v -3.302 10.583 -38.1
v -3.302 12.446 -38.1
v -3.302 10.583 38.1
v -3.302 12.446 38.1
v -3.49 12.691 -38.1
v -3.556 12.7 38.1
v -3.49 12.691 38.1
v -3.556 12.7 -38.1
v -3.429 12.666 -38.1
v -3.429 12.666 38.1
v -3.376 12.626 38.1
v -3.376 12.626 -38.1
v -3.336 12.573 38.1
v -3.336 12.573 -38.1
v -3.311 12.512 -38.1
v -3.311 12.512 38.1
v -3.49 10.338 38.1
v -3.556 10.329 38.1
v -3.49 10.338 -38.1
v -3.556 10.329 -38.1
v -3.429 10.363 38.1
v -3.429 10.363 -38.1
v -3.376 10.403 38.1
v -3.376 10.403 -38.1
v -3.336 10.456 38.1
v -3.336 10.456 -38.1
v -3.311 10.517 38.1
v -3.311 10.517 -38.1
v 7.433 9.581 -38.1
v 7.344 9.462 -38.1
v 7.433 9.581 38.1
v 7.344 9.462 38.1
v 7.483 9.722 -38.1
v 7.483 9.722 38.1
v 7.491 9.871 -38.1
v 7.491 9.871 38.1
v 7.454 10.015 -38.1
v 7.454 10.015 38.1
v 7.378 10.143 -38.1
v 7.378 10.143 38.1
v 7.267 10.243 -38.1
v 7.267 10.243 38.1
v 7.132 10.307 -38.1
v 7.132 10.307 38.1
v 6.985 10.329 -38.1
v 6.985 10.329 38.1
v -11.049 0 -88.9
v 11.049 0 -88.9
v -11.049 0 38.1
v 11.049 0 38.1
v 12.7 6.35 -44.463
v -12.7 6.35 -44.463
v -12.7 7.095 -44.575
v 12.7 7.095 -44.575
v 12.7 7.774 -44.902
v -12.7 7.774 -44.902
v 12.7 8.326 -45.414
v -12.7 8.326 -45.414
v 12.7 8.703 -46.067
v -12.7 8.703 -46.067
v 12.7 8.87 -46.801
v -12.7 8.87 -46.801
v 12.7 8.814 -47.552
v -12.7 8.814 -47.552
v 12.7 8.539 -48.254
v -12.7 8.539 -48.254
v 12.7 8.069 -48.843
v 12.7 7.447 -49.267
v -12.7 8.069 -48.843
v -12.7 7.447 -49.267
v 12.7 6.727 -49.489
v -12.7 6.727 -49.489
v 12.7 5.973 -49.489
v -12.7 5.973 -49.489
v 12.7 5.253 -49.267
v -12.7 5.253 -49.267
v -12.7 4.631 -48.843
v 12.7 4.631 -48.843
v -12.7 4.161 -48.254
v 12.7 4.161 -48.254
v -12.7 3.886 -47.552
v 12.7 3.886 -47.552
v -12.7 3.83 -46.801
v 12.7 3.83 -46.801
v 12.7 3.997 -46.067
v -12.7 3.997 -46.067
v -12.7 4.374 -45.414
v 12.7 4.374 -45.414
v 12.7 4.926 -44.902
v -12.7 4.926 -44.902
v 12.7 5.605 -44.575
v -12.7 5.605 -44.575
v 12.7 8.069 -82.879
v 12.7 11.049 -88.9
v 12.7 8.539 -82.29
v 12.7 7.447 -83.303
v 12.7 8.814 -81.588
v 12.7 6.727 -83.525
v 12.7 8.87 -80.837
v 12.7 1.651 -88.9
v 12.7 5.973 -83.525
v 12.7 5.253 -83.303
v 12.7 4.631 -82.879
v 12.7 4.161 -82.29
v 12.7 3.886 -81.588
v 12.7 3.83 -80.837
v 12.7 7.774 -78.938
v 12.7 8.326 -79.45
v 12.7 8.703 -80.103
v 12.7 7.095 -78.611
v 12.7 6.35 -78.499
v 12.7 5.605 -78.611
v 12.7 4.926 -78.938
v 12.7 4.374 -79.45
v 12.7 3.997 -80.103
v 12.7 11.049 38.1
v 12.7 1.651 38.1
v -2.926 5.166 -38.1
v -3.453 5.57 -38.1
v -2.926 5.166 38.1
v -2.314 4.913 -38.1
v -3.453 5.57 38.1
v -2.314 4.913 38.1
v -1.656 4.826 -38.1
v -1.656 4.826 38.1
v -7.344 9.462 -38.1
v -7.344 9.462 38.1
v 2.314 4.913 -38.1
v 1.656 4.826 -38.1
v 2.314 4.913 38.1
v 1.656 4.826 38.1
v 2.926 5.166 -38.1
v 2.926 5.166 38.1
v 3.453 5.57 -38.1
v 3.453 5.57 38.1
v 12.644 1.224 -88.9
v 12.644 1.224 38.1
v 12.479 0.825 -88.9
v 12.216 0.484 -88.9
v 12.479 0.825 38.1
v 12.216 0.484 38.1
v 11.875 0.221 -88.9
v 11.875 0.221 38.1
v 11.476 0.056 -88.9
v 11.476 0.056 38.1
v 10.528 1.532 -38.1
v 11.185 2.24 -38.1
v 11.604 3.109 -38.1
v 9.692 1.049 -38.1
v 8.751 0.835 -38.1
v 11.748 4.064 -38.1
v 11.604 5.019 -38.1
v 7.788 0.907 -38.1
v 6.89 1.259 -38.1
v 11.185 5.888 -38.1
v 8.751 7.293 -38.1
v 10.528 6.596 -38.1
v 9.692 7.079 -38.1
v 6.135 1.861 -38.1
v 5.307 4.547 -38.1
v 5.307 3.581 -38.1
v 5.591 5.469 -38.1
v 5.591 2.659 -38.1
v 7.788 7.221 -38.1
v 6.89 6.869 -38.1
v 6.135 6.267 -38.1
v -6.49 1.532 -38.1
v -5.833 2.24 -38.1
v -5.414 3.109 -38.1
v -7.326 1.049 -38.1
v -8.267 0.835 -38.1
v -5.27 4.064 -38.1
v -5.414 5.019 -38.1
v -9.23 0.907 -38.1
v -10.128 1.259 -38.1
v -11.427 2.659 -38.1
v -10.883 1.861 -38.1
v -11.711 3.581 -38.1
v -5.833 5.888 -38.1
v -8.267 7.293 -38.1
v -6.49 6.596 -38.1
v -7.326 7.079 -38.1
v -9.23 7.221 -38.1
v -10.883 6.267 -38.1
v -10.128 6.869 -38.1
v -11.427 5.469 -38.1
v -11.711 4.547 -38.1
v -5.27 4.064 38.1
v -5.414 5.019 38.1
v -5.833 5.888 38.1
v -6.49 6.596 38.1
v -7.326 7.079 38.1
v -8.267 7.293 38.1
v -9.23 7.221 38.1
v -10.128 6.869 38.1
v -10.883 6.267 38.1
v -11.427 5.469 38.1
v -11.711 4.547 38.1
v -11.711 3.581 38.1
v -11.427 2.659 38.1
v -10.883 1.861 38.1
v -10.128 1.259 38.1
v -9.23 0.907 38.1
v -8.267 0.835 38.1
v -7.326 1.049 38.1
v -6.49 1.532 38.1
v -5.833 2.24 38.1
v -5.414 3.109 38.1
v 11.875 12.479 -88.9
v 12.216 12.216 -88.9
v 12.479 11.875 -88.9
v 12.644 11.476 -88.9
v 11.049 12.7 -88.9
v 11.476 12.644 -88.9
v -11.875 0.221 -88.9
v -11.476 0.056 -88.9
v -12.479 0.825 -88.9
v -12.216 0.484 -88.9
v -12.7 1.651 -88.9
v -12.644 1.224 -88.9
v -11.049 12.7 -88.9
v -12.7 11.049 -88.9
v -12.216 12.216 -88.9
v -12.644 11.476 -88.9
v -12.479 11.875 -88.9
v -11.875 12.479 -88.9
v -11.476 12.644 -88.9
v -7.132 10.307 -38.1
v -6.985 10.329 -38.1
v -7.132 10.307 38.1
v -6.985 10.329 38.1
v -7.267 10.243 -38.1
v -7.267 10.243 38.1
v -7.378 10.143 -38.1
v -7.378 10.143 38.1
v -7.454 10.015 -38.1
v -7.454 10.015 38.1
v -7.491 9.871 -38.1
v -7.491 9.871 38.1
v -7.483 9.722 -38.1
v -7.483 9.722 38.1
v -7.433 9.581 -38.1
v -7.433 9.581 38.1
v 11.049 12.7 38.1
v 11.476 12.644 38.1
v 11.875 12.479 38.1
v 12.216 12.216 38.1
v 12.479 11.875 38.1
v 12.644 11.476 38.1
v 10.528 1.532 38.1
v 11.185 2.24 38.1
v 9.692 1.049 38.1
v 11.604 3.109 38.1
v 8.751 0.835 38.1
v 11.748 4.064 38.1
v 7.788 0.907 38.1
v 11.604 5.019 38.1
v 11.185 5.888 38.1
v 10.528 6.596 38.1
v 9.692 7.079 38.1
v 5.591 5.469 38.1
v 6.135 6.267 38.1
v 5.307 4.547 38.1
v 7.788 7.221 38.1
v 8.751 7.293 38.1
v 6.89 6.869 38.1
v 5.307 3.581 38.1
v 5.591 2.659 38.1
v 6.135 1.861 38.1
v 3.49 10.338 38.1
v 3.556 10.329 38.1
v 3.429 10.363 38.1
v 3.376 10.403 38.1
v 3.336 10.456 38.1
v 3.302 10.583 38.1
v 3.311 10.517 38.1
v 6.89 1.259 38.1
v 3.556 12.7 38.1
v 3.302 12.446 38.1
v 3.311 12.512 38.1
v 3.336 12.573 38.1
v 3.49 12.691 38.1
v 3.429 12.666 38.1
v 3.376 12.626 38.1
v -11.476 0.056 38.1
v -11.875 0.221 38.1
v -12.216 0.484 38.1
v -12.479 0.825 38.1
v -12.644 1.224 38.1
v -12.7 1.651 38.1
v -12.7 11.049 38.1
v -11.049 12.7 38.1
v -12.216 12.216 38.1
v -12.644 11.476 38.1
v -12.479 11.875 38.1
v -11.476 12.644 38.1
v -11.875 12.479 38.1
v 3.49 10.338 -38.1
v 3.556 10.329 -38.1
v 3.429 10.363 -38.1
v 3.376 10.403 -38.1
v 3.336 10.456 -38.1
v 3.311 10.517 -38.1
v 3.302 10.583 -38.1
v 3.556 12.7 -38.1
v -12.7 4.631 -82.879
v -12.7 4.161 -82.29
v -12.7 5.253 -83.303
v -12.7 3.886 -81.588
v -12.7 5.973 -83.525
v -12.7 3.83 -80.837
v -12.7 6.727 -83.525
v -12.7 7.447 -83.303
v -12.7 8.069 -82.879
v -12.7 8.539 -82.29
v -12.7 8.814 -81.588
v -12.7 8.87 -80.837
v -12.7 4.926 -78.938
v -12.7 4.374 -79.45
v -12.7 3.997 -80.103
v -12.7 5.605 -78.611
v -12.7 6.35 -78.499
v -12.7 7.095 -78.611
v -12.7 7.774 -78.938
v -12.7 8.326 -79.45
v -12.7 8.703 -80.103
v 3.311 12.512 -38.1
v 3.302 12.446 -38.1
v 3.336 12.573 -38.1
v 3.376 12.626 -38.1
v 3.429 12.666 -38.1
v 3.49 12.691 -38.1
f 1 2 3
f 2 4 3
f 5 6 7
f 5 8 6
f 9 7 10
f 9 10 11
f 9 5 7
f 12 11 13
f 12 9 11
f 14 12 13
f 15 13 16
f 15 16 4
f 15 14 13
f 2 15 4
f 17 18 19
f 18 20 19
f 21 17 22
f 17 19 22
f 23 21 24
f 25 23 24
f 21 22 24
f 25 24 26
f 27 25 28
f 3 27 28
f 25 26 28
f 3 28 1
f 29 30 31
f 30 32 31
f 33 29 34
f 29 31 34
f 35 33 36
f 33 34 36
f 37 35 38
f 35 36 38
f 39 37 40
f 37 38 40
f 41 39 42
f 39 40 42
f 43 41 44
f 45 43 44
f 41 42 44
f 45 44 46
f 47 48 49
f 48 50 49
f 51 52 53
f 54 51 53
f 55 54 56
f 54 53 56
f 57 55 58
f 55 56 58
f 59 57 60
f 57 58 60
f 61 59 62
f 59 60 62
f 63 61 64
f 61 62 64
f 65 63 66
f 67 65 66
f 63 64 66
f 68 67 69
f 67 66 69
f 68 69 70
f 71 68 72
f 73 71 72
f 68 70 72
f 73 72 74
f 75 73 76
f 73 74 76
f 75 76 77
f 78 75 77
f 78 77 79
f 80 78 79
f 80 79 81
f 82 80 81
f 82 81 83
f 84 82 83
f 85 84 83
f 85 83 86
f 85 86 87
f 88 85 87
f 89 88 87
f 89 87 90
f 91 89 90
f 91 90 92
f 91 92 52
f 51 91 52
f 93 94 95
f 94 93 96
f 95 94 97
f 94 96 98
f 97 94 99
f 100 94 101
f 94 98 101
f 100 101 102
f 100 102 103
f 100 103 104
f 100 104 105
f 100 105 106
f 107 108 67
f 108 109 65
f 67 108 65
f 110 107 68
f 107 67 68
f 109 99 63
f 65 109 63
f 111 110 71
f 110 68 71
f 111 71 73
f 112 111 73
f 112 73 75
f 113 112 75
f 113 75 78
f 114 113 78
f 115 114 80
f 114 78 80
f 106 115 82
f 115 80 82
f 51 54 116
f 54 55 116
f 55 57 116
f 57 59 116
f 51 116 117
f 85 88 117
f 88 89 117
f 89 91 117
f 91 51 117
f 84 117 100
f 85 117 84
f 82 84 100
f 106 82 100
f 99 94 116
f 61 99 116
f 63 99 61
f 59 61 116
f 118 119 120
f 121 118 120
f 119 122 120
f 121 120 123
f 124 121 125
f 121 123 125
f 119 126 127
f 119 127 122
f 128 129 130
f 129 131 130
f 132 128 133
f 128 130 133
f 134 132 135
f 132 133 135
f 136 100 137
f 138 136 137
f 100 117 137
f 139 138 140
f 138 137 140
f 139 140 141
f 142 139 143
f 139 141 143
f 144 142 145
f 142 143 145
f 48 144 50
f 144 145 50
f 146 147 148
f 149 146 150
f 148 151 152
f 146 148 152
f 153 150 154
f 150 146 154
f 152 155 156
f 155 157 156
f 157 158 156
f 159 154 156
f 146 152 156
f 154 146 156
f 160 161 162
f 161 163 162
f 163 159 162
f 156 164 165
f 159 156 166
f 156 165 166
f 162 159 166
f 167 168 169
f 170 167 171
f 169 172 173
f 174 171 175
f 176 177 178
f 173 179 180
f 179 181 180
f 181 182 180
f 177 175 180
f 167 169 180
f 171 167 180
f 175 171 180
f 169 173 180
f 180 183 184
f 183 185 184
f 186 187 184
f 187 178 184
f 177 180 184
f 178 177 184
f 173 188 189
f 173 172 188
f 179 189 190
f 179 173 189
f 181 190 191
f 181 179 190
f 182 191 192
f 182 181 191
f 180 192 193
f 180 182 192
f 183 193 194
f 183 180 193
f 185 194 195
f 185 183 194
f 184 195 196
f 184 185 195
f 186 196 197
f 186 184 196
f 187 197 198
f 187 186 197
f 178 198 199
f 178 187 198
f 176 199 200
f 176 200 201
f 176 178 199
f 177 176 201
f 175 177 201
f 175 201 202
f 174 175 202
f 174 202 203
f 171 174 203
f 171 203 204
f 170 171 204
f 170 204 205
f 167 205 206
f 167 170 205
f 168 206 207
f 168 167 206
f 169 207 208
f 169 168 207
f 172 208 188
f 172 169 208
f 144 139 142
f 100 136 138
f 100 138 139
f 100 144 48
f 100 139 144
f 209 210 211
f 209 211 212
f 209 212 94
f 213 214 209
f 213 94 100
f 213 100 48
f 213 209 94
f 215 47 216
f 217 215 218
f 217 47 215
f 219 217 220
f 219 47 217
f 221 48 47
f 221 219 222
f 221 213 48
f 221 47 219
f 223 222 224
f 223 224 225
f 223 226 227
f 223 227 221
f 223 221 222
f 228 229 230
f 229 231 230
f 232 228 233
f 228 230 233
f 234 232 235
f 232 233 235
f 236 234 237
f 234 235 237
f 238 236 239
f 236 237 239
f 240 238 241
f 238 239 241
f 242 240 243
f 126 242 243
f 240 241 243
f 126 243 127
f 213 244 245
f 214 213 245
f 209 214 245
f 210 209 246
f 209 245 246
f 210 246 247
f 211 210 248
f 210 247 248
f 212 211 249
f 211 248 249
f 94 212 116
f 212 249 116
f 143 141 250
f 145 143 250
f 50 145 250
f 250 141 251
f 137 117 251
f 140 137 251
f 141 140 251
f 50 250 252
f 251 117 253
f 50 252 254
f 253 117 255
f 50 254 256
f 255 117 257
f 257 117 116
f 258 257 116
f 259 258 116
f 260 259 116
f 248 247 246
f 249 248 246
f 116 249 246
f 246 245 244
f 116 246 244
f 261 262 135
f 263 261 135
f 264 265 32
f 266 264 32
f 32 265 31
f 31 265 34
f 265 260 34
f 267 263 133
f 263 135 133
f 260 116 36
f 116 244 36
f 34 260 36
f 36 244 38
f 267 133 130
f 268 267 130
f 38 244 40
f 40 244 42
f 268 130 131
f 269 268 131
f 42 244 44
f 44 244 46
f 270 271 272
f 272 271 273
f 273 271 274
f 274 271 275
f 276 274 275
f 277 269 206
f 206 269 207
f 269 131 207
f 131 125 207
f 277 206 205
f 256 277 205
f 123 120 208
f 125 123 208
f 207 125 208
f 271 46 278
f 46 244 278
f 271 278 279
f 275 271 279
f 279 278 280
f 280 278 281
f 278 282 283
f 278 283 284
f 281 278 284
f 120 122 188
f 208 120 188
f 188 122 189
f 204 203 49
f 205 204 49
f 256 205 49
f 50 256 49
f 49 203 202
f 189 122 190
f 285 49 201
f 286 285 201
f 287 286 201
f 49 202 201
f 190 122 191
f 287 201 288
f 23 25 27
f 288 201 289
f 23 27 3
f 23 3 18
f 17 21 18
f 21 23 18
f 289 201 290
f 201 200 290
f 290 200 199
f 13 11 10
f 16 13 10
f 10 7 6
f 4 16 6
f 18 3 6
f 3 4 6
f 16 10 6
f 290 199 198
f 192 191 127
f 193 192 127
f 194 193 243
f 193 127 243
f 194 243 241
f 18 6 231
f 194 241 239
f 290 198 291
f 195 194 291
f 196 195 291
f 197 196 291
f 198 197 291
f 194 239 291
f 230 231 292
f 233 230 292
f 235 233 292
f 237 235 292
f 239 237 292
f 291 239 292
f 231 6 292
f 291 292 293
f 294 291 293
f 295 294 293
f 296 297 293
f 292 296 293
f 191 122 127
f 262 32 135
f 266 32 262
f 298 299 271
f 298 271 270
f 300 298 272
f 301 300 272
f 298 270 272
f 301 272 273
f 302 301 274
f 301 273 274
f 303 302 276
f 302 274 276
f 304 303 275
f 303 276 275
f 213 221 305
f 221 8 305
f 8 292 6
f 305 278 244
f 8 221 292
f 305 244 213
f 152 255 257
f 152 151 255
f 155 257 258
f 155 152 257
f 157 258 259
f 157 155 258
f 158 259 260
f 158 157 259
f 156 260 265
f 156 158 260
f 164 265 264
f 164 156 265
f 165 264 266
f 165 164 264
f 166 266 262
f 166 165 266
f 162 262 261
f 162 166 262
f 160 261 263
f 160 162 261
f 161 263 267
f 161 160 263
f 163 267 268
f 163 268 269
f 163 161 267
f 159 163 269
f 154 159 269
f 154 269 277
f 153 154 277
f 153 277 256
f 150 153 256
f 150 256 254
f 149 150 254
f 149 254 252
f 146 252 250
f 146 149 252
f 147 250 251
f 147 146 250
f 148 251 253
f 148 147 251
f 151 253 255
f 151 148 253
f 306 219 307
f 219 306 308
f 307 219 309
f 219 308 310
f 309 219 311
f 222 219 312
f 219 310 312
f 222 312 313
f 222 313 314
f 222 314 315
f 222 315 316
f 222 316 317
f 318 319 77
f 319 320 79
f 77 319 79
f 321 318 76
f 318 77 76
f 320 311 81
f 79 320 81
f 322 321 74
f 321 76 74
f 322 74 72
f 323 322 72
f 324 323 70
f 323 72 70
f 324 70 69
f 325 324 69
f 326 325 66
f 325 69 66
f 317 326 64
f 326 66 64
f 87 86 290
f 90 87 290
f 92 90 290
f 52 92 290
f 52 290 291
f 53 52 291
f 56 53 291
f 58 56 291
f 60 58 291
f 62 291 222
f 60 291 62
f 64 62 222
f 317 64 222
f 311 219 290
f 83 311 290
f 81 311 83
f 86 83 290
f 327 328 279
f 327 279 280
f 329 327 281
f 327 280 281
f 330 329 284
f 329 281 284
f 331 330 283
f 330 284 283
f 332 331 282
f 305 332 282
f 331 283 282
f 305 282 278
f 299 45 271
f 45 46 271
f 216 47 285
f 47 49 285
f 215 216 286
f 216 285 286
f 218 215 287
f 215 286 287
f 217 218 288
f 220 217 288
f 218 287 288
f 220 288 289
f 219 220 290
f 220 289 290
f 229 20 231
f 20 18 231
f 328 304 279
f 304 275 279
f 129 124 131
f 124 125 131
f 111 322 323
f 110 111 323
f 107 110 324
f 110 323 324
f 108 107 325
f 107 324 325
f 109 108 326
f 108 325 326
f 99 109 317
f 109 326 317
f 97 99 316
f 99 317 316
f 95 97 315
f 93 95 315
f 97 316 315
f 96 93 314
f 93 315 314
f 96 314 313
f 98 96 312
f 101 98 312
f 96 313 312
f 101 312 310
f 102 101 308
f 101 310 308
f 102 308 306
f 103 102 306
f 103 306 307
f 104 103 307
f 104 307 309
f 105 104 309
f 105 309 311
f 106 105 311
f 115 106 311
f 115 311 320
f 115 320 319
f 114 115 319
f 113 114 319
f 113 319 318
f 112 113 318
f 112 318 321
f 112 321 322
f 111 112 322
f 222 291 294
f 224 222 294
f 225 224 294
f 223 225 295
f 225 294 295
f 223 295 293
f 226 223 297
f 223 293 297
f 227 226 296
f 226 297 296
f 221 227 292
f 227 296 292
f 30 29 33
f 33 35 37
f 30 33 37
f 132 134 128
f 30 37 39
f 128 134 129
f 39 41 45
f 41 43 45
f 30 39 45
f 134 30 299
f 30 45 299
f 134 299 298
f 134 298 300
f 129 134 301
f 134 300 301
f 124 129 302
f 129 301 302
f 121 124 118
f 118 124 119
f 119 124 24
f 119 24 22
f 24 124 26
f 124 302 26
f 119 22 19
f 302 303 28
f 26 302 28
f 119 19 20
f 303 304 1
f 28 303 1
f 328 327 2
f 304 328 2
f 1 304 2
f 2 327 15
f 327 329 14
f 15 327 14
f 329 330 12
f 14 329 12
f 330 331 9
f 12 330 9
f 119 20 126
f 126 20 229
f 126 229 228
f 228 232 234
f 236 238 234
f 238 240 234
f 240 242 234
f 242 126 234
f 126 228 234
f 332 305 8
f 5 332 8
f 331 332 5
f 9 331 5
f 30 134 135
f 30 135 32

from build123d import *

# Parameters (mm, degrees)
SKETCH3_R                  = 3.2385
BOSS_EXTRUDE1_DEPTH        = 38.1
FILLET1_R                  = 0.254
BOSS_EXTRUDE2_DEPTH        = 50.8
F_8_0_199_DIAMETER_HOLE8_D = 5.0546
LPATTERN1_COUNT            = 2
LPATTERN1_PITCH            = 34.036


with BuildPart() as part:
    # Sketch3 → Boss-Extrude1 (new body, symmetric)
    with BuildSketch(Plane.XY):
        with BuildLine():
            Line((-11.049, 12.7), (-3.302, 12.7))
            Line((-3.302, 12.7), (-3.302, 10.328863887))
            Line((-3.302, 10.328863887), (-6.985, 10.328863887))
            ThreePointArc((-6.985, 10.328863887), (-7.454330803, 10.01526707), (-7.344210245, 9.461653642))
            Line((-7.344210245, 9.461653642), (-3.452505379, 5.569948776))
            ThreePointArc((-3.452505379, 5.569948776), (-2.628470073, 5.019345987), (-1.656454155, 4.826))
            Line((-1.656454155, 4.826), (1.656454155, 4.826))
            ThreePointArc((1.656454155, 4.826), (2.628470073, 5.019345987), (3.452505379, 5.569948776))
            Line((3.452505379, 5.569948776), (7.344210245, 9.461653642))
            ThreePointArc((7.344210245, 9.461653642), (7.454330803, 10.01526707), (6.985, 10.328863887))
            Line((6.985, 10.328863887), (3.302, 10.328863887))
            Line((3.302, 10.328863887), (3.302, 12.7))
            Line((3.302, 12.7), (11.049, 12.7))
            ThreePointArc((11.049, 12.7), (12.216433296, 12.216433296), (12.7, 11.049))
            Line((12.7, 11.049), (12.7, 1.651))
            ThreePointArc((12.7, 1.651), (12.216433296, 0.483566704), (11.049, 0))
            Line((11.049, 0), (-11.049, 0))
            ThreePointArc((-11.049, 0), (-12.216433296, 0.483566704), (-12.7, 1.651))
            Line((-12.7, 1.651), (-12.7, 11.049))
            ThreePointArc((-12.7, 11.049), (-12.216433296, 12.216433296), (-11.049, 12.7))
        make_face()
        with Locations((8.509, 4.064)):
            Circle(SKETCH3_R, mode=Mode.SUBTRACT)
        with Locations((-8.509, 4.064)):
            Circle(SKETCH3_R, mode=Mode.SUBTRACT)
    extrude(amount=BOSS_EXTRUDE1_DEPTH, both=True)

    # Fillet1
    fillet1_edges = [part.edges().sort_by_distance(p)[0] for p in [
        (-3.302, 12.7, 0),
        (-3.302, 10.328863887, 0),
        (3.302, 10.328863887, 0),
        (3.302, 12.7, 0),
    ]]
    fillet(fillet1_edges, radius=FILLET1_R)

    # Sketch4 → Boss-Extrude2 (add)
    with BuildSketch(Plane(origin=(0, 0, -38.1), x_dir=(-1, 0, 0), z_dir=(0, 0, -1))):
        with BuildLine():
            Line((3.556, 12.7), (-11.049, 12.7))
            ThreePointArc((-11.049, 12.7), (-12.216433296, 12.216433296), (-12.7, 11.049))
            Line((-12.7, 11.049), (-12.7, 1.651))
            ThreePointArc((-12.7, 1.651), (-12.216433296, 0.483566704), (-11.049, 0))
            Line((-11.049, 0), (11.049, 0))
            ThreePointArc((11.049, 0), (12.216433296, 0.483566704), (12.7, 1.651))
            Line((12.7, 1.651), (12.7, 11.049))
            ThreePointArc((12.7, 11.049), (12.216433296, 12.216433296), (11.049, 12.7))
            Line((11.049, 12.7), (3.556, 12.7))
        make_face()
    extrude(amount=BOSS_EXTRUDE2_DEPTH)

    # #8 (0.199) Diameter Hole8 (through all)
    with Locations(Plane(origin=(12.7, 0, 0), x_dir=(0, 0, -1), z_dir=(1, 0, 0))):
        with Locations((81.026, 6.35)):
            f_8_0_199_diameter_hole8 = Hole(F_8_0_199_DIAMETER_HOLE8_D / 2)

    # LPattern1: #8 (0.199) Diameter Hole8 ×2
    with Locations(*[(0, 0, i * LPATTERN1_PITCH) for i in range(1, LPATTERN1_COUNT)]):
        add(f_8_0_199_diameter_hole8, mode=Mode.SUBTRACT)


solid = part.part
